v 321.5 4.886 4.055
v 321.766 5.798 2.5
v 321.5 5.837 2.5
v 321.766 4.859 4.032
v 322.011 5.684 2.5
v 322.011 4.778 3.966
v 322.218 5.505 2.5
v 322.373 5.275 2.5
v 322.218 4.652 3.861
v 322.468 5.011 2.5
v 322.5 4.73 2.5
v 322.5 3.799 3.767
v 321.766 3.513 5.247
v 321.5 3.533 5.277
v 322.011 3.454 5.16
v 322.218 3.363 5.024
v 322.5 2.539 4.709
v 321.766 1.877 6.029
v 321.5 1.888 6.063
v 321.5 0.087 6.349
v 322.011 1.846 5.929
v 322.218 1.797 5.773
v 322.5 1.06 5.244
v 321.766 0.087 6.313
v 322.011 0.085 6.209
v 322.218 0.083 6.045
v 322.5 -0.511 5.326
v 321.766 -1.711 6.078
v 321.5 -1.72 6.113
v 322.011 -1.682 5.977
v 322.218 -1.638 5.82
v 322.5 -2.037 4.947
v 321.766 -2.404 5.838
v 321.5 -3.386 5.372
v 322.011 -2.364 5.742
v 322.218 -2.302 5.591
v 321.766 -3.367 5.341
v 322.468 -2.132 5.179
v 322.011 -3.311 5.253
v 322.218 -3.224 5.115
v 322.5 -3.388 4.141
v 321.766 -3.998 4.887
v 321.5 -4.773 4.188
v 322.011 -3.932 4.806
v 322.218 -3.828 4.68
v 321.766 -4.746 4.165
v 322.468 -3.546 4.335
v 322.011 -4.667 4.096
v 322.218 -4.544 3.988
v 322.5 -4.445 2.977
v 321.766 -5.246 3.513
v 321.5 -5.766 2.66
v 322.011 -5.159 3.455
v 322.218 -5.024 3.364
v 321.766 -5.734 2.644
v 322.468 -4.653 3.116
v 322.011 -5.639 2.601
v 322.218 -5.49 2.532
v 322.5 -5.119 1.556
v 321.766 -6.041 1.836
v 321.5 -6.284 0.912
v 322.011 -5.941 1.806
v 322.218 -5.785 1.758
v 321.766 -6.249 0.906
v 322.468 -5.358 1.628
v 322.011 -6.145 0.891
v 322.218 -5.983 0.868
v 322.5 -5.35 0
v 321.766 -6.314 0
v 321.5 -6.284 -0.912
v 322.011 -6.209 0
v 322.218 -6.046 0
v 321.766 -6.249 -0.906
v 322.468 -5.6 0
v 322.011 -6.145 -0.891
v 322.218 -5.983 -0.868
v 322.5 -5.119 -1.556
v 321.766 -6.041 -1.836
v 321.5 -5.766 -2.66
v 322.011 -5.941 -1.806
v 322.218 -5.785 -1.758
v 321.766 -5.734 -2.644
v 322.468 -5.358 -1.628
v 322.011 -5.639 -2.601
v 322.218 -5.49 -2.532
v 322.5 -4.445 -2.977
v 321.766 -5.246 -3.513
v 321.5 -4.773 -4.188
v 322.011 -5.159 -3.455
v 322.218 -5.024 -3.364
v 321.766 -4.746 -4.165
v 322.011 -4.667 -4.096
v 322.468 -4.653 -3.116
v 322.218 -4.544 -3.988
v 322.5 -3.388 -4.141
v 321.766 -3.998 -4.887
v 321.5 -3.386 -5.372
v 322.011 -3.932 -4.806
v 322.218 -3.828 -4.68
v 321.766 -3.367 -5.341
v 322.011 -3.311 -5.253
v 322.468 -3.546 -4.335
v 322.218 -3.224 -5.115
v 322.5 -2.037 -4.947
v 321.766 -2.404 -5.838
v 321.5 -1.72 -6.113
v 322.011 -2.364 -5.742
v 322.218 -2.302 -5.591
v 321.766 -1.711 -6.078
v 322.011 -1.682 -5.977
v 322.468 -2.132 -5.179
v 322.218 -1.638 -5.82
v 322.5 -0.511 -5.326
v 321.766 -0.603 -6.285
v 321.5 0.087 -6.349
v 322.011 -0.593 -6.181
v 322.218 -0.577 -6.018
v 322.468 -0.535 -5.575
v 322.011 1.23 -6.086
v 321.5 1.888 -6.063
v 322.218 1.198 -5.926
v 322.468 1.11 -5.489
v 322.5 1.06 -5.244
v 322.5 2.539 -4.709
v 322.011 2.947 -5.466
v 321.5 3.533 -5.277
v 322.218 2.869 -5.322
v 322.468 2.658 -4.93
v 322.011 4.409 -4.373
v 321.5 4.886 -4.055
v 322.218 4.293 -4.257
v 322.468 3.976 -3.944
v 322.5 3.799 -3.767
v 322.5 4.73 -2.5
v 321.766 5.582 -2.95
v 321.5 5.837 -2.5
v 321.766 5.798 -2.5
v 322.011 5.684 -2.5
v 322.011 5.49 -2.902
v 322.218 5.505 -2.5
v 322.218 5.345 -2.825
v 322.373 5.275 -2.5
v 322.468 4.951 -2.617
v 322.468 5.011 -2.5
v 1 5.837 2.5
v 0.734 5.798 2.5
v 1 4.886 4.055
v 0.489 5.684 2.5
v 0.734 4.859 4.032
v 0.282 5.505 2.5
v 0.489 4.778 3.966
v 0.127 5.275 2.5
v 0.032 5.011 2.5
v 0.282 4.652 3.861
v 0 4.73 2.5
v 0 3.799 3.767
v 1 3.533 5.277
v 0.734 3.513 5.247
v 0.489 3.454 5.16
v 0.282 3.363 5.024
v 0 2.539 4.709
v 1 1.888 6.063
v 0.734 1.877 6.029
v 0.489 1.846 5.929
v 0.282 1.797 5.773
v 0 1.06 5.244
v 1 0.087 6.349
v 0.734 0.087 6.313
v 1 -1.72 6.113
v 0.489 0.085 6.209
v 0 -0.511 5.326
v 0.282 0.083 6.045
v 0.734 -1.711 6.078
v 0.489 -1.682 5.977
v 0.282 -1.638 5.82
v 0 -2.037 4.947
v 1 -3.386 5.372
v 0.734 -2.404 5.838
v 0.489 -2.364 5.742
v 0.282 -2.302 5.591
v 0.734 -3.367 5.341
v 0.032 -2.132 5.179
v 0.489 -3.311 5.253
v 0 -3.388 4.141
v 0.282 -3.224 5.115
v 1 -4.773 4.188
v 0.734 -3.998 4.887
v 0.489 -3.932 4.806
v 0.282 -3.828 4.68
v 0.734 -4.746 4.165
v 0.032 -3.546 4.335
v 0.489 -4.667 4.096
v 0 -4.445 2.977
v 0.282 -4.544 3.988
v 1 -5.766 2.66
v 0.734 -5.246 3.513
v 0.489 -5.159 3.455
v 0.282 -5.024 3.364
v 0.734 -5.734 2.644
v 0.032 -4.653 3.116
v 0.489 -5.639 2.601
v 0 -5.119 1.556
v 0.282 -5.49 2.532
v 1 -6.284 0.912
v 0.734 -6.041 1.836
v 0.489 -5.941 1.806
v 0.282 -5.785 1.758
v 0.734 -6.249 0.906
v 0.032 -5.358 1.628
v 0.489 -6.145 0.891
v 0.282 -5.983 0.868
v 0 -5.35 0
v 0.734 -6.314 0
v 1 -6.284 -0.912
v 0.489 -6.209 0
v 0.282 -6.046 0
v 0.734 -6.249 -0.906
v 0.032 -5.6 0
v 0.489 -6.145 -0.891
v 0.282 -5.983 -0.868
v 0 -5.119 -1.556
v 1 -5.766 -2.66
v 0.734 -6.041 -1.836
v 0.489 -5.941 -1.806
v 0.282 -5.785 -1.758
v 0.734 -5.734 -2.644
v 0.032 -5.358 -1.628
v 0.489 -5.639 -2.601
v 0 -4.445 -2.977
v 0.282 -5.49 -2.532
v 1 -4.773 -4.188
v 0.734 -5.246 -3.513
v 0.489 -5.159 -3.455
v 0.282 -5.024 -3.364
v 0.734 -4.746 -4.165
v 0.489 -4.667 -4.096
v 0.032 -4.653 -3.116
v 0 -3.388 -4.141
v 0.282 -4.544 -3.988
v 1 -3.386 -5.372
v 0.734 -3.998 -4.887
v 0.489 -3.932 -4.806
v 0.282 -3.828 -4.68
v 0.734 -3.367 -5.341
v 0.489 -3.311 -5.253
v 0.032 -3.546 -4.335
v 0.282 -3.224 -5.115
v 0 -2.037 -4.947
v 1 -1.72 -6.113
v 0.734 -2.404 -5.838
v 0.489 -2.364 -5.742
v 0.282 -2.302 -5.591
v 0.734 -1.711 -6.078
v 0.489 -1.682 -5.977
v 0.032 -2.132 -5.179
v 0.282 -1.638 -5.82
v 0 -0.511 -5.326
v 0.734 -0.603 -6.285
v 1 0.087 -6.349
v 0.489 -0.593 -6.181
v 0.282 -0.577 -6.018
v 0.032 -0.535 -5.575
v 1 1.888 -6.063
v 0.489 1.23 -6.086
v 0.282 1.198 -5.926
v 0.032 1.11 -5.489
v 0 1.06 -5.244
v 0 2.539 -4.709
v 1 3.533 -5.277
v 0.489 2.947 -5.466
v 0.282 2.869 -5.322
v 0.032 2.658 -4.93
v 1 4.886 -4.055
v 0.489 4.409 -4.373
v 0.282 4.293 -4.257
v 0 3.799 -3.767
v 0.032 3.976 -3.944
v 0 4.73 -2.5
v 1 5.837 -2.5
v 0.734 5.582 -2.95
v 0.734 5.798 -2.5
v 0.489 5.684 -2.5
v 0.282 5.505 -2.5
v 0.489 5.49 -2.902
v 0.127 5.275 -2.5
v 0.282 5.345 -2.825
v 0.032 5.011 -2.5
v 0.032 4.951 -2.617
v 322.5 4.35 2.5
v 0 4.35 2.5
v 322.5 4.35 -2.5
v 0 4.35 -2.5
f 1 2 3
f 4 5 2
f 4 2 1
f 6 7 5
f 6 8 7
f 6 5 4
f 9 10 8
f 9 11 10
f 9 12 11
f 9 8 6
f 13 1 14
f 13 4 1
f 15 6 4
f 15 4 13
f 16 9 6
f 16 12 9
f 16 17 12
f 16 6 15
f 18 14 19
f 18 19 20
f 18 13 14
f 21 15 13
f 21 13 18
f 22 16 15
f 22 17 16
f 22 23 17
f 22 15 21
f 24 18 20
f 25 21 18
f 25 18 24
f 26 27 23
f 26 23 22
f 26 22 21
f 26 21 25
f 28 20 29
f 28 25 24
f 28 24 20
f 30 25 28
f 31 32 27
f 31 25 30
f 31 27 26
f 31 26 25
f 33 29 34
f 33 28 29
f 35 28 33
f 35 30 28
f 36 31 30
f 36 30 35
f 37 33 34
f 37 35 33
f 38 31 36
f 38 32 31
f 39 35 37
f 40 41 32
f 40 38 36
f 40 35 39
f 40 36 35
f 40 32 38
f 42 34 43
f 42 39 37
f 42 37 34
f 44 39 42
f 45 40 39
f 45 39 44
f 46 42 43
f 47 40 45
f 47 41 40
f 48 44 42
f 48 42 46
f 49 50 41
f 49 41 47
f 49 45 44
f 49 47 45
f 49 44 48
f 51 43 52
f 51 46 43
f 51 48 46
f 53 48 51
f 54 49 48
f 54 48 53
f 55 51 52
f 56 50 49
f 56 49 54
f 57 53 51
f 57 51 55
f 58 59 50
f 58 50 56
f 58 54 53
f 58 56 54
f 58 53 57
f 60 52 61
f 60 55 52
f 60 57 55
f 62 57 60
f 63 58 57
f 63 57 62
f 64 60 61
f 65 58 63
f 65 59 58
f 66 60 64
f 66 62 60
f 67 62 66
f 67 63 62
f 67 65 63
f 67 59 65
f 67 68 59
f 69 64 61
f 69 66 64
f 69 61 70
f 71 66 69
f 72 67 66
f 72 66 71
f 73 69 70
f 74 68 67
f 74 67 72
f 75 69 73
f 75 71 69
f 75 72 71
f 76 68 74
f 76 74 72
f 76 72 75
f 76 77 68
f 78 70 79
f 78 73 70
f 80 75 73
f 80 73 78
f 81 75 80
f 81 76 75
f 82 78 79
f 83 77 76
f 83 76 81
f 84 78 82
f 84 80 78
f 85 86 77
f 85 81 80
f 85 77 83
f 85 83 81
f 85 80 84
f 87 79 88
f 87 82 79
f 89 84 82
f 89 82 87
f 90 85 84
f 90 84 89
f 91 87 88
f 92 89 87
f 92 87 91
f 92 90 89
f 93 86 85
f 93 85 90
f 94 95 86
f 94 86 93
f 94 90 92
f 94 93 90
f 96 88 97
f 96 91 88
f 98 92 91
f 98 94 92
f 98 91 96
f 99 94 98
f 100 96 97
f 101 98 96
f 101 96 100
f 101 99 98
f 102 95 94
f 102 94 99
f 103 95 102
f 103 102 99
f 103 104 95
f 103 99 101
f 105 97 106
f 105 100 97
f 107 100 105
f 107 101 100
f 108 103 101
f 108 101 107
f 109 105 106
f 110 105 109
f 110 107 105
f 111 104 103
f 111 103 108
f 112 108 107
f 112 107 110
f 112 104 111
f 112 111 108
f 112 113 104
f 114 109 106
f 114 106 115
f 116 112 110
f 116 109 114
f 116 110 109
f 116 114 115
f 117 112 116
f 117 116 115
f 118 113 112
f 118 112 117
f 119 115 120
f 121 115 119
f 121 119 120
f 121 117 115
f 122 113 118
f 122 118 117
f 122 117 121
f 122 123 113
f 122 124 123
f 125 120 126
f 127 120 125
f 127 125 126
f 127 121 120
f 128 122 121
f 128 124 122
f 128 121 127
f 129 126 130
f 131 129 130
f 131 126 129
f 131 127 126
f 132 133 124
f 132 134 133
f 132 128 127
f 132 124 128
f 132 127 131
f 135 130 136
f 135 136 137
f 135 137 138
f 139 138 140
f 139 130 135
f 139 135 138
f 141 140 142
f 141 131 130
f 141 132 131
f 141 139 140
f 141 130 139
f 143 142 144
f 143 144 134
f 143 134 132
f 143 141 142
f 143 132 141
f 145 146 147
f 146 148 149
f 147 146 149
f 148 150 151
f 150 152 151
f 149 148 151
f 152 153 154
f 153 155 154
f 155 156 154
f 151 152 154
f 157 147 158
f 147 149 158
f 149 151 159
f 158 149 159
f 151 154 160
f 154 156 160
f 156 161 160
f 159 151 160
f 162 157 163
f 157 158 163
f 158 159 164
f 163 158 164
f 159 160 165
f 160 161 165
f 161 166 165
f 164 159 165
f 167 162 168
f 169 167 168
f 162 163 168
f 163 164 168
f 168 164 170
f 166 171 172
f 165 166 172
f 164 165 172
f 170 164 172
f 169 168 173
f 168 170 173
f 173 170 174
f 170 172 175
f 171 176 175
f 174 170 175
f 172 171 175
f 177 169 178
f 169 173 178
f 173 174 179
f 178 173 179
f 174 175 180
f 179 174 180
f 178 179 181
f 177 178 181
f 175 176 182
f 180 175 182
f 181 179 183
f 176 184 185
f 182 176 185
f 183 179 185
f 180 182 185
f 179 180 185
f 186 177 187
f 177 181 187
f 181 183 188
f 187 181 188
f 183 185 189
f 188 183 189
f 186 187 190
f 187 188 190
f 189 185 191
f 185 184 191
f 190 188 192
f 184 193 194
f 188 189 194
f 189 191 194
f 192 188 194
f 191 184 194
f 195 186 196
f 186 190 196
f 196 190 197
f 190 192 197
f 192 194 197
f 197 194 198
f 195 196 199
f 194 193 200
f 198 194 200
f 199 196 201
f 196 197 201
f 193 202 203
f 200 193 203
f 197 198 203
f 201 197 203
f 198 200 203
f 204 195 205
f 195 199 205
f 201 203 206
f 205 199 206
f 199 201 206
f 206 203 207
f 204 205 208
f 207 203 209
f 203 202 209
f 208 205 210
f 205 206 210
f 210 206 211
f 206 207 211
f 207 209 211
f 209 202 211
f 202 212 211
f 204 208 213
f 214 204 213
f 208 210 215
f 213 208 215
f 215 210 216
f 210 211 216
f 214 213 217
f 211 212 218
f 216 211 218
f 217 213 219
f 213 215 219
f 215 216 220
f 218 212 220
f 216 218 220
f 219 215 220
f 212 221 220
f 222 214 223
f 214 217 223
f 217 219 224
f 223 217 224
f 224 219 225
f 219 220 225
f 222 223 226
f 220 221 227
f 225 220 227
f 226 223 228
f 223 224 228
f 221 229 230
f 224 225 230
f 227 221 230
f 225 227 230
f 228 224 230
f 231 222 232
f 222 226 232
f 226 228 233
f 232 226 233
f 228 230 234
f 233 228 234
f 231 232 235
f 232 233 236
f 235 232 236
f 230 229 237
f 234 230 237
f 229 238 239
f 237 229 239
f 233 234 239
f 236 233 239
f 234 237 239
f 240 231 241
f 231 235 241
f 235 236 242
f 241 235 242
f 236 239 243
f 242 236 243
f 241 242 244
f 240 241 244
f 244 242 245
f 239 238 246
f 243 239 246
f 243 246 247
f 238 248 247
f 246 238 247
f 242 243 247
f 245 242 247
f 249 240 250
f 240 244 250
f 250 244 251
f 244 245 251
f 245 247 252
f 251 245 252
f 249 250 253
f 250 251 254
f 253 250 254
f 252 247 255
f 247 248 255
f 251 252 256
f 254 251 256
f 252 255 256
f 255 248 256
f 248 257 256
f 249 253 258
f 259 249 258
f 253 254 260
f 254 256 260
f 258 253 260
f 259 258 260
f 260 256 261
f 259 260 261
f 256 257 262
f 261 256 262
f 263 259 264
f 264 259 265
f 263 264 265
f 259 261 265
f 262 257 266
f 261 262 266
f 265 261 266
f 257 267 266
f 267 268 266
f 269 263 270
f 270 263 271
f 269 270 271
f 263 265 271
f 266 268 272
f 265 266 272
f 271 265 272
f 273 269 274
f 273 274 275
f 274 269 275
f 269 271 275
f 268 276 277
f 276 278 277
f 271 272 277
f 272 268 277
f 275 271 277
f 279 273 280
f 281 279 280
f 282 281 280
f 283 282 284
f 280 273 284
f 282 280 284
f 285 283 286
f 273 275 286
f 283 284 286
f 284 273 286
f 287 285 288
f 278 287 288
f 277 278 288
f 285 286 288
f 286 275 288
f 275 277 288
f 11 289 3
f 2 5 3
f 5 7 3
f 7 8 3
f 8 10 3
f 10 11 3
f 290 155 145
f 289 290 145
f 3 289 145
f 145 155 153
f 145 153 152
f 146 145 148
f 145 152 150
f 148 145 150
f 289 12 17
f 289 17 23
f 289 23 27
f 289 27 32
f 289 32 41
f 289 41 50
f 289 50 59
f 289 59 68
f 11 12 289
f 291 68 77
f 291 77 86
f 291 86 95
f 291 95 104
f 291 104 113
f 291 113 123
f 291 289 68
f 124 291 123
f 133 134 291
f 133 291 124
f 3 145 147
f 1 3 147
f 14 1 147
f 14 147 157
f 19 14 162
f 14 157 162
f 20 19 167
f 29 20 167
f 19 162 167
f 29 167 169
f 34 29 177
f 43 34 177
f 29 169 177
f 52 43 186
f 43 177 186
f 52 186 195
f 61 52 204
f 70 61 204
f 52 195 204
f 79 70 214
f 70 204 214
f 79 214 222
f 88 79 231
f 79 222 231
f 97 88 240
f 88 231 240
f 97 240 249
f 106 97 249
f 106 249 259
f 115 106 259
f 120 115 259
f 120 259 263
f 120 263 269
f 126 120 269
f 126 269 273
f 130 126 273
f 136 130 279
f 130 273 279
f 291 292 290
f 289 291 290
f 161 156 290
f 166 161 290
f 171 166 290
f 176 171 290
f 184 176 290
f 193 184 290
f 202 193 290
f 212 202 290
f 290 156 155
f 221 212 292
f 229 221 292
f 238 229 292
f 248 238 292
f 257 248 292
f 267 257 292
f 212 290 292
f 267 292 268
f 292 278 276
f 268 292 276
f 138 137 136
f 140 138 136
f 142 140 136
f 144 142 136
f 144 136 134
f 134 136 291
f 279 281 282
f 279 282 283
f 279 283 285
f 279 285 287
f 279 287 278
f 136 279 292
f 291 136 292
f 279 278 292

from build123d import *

# Parameters (mm, degrees)
BOSS_EXTRUDE1_DEPTH = 322.5
FILLET1_R           = 1


with BuildPart() as part:
    # Sketch2 → Boss-Extrude1 (new body)
    with BuildSketch(Plane(origin=(0, 0, 0), x_dir=(0, 0, -1), z_dir=(1, 0, 0))):
        with BuildLine():
            Line((2.5, 5.837165408), (2.5, 4.35))
            Line((2.5, 4.35), (-2.5, 4.35))
            Line((-2.5, 4.35), (-2.5, 5.837165408))
            ThreePointArc((-2.5, 5.837165408), (0, -6.35), (2.5, 5.837165408))
        make_face()
    extrude(amount=BOSS_EXTRUDE1_DEPTH)

    # Fillet1
    fillet1_edges = [part.edges().sort_by_distance(p)[0] for p in [
        (0, -6.35, 0),
        (322.5, -6.35, 0),
    ]]
    fillet(fillet1_edges, radius=FILLET1_R)


solid = part.part
